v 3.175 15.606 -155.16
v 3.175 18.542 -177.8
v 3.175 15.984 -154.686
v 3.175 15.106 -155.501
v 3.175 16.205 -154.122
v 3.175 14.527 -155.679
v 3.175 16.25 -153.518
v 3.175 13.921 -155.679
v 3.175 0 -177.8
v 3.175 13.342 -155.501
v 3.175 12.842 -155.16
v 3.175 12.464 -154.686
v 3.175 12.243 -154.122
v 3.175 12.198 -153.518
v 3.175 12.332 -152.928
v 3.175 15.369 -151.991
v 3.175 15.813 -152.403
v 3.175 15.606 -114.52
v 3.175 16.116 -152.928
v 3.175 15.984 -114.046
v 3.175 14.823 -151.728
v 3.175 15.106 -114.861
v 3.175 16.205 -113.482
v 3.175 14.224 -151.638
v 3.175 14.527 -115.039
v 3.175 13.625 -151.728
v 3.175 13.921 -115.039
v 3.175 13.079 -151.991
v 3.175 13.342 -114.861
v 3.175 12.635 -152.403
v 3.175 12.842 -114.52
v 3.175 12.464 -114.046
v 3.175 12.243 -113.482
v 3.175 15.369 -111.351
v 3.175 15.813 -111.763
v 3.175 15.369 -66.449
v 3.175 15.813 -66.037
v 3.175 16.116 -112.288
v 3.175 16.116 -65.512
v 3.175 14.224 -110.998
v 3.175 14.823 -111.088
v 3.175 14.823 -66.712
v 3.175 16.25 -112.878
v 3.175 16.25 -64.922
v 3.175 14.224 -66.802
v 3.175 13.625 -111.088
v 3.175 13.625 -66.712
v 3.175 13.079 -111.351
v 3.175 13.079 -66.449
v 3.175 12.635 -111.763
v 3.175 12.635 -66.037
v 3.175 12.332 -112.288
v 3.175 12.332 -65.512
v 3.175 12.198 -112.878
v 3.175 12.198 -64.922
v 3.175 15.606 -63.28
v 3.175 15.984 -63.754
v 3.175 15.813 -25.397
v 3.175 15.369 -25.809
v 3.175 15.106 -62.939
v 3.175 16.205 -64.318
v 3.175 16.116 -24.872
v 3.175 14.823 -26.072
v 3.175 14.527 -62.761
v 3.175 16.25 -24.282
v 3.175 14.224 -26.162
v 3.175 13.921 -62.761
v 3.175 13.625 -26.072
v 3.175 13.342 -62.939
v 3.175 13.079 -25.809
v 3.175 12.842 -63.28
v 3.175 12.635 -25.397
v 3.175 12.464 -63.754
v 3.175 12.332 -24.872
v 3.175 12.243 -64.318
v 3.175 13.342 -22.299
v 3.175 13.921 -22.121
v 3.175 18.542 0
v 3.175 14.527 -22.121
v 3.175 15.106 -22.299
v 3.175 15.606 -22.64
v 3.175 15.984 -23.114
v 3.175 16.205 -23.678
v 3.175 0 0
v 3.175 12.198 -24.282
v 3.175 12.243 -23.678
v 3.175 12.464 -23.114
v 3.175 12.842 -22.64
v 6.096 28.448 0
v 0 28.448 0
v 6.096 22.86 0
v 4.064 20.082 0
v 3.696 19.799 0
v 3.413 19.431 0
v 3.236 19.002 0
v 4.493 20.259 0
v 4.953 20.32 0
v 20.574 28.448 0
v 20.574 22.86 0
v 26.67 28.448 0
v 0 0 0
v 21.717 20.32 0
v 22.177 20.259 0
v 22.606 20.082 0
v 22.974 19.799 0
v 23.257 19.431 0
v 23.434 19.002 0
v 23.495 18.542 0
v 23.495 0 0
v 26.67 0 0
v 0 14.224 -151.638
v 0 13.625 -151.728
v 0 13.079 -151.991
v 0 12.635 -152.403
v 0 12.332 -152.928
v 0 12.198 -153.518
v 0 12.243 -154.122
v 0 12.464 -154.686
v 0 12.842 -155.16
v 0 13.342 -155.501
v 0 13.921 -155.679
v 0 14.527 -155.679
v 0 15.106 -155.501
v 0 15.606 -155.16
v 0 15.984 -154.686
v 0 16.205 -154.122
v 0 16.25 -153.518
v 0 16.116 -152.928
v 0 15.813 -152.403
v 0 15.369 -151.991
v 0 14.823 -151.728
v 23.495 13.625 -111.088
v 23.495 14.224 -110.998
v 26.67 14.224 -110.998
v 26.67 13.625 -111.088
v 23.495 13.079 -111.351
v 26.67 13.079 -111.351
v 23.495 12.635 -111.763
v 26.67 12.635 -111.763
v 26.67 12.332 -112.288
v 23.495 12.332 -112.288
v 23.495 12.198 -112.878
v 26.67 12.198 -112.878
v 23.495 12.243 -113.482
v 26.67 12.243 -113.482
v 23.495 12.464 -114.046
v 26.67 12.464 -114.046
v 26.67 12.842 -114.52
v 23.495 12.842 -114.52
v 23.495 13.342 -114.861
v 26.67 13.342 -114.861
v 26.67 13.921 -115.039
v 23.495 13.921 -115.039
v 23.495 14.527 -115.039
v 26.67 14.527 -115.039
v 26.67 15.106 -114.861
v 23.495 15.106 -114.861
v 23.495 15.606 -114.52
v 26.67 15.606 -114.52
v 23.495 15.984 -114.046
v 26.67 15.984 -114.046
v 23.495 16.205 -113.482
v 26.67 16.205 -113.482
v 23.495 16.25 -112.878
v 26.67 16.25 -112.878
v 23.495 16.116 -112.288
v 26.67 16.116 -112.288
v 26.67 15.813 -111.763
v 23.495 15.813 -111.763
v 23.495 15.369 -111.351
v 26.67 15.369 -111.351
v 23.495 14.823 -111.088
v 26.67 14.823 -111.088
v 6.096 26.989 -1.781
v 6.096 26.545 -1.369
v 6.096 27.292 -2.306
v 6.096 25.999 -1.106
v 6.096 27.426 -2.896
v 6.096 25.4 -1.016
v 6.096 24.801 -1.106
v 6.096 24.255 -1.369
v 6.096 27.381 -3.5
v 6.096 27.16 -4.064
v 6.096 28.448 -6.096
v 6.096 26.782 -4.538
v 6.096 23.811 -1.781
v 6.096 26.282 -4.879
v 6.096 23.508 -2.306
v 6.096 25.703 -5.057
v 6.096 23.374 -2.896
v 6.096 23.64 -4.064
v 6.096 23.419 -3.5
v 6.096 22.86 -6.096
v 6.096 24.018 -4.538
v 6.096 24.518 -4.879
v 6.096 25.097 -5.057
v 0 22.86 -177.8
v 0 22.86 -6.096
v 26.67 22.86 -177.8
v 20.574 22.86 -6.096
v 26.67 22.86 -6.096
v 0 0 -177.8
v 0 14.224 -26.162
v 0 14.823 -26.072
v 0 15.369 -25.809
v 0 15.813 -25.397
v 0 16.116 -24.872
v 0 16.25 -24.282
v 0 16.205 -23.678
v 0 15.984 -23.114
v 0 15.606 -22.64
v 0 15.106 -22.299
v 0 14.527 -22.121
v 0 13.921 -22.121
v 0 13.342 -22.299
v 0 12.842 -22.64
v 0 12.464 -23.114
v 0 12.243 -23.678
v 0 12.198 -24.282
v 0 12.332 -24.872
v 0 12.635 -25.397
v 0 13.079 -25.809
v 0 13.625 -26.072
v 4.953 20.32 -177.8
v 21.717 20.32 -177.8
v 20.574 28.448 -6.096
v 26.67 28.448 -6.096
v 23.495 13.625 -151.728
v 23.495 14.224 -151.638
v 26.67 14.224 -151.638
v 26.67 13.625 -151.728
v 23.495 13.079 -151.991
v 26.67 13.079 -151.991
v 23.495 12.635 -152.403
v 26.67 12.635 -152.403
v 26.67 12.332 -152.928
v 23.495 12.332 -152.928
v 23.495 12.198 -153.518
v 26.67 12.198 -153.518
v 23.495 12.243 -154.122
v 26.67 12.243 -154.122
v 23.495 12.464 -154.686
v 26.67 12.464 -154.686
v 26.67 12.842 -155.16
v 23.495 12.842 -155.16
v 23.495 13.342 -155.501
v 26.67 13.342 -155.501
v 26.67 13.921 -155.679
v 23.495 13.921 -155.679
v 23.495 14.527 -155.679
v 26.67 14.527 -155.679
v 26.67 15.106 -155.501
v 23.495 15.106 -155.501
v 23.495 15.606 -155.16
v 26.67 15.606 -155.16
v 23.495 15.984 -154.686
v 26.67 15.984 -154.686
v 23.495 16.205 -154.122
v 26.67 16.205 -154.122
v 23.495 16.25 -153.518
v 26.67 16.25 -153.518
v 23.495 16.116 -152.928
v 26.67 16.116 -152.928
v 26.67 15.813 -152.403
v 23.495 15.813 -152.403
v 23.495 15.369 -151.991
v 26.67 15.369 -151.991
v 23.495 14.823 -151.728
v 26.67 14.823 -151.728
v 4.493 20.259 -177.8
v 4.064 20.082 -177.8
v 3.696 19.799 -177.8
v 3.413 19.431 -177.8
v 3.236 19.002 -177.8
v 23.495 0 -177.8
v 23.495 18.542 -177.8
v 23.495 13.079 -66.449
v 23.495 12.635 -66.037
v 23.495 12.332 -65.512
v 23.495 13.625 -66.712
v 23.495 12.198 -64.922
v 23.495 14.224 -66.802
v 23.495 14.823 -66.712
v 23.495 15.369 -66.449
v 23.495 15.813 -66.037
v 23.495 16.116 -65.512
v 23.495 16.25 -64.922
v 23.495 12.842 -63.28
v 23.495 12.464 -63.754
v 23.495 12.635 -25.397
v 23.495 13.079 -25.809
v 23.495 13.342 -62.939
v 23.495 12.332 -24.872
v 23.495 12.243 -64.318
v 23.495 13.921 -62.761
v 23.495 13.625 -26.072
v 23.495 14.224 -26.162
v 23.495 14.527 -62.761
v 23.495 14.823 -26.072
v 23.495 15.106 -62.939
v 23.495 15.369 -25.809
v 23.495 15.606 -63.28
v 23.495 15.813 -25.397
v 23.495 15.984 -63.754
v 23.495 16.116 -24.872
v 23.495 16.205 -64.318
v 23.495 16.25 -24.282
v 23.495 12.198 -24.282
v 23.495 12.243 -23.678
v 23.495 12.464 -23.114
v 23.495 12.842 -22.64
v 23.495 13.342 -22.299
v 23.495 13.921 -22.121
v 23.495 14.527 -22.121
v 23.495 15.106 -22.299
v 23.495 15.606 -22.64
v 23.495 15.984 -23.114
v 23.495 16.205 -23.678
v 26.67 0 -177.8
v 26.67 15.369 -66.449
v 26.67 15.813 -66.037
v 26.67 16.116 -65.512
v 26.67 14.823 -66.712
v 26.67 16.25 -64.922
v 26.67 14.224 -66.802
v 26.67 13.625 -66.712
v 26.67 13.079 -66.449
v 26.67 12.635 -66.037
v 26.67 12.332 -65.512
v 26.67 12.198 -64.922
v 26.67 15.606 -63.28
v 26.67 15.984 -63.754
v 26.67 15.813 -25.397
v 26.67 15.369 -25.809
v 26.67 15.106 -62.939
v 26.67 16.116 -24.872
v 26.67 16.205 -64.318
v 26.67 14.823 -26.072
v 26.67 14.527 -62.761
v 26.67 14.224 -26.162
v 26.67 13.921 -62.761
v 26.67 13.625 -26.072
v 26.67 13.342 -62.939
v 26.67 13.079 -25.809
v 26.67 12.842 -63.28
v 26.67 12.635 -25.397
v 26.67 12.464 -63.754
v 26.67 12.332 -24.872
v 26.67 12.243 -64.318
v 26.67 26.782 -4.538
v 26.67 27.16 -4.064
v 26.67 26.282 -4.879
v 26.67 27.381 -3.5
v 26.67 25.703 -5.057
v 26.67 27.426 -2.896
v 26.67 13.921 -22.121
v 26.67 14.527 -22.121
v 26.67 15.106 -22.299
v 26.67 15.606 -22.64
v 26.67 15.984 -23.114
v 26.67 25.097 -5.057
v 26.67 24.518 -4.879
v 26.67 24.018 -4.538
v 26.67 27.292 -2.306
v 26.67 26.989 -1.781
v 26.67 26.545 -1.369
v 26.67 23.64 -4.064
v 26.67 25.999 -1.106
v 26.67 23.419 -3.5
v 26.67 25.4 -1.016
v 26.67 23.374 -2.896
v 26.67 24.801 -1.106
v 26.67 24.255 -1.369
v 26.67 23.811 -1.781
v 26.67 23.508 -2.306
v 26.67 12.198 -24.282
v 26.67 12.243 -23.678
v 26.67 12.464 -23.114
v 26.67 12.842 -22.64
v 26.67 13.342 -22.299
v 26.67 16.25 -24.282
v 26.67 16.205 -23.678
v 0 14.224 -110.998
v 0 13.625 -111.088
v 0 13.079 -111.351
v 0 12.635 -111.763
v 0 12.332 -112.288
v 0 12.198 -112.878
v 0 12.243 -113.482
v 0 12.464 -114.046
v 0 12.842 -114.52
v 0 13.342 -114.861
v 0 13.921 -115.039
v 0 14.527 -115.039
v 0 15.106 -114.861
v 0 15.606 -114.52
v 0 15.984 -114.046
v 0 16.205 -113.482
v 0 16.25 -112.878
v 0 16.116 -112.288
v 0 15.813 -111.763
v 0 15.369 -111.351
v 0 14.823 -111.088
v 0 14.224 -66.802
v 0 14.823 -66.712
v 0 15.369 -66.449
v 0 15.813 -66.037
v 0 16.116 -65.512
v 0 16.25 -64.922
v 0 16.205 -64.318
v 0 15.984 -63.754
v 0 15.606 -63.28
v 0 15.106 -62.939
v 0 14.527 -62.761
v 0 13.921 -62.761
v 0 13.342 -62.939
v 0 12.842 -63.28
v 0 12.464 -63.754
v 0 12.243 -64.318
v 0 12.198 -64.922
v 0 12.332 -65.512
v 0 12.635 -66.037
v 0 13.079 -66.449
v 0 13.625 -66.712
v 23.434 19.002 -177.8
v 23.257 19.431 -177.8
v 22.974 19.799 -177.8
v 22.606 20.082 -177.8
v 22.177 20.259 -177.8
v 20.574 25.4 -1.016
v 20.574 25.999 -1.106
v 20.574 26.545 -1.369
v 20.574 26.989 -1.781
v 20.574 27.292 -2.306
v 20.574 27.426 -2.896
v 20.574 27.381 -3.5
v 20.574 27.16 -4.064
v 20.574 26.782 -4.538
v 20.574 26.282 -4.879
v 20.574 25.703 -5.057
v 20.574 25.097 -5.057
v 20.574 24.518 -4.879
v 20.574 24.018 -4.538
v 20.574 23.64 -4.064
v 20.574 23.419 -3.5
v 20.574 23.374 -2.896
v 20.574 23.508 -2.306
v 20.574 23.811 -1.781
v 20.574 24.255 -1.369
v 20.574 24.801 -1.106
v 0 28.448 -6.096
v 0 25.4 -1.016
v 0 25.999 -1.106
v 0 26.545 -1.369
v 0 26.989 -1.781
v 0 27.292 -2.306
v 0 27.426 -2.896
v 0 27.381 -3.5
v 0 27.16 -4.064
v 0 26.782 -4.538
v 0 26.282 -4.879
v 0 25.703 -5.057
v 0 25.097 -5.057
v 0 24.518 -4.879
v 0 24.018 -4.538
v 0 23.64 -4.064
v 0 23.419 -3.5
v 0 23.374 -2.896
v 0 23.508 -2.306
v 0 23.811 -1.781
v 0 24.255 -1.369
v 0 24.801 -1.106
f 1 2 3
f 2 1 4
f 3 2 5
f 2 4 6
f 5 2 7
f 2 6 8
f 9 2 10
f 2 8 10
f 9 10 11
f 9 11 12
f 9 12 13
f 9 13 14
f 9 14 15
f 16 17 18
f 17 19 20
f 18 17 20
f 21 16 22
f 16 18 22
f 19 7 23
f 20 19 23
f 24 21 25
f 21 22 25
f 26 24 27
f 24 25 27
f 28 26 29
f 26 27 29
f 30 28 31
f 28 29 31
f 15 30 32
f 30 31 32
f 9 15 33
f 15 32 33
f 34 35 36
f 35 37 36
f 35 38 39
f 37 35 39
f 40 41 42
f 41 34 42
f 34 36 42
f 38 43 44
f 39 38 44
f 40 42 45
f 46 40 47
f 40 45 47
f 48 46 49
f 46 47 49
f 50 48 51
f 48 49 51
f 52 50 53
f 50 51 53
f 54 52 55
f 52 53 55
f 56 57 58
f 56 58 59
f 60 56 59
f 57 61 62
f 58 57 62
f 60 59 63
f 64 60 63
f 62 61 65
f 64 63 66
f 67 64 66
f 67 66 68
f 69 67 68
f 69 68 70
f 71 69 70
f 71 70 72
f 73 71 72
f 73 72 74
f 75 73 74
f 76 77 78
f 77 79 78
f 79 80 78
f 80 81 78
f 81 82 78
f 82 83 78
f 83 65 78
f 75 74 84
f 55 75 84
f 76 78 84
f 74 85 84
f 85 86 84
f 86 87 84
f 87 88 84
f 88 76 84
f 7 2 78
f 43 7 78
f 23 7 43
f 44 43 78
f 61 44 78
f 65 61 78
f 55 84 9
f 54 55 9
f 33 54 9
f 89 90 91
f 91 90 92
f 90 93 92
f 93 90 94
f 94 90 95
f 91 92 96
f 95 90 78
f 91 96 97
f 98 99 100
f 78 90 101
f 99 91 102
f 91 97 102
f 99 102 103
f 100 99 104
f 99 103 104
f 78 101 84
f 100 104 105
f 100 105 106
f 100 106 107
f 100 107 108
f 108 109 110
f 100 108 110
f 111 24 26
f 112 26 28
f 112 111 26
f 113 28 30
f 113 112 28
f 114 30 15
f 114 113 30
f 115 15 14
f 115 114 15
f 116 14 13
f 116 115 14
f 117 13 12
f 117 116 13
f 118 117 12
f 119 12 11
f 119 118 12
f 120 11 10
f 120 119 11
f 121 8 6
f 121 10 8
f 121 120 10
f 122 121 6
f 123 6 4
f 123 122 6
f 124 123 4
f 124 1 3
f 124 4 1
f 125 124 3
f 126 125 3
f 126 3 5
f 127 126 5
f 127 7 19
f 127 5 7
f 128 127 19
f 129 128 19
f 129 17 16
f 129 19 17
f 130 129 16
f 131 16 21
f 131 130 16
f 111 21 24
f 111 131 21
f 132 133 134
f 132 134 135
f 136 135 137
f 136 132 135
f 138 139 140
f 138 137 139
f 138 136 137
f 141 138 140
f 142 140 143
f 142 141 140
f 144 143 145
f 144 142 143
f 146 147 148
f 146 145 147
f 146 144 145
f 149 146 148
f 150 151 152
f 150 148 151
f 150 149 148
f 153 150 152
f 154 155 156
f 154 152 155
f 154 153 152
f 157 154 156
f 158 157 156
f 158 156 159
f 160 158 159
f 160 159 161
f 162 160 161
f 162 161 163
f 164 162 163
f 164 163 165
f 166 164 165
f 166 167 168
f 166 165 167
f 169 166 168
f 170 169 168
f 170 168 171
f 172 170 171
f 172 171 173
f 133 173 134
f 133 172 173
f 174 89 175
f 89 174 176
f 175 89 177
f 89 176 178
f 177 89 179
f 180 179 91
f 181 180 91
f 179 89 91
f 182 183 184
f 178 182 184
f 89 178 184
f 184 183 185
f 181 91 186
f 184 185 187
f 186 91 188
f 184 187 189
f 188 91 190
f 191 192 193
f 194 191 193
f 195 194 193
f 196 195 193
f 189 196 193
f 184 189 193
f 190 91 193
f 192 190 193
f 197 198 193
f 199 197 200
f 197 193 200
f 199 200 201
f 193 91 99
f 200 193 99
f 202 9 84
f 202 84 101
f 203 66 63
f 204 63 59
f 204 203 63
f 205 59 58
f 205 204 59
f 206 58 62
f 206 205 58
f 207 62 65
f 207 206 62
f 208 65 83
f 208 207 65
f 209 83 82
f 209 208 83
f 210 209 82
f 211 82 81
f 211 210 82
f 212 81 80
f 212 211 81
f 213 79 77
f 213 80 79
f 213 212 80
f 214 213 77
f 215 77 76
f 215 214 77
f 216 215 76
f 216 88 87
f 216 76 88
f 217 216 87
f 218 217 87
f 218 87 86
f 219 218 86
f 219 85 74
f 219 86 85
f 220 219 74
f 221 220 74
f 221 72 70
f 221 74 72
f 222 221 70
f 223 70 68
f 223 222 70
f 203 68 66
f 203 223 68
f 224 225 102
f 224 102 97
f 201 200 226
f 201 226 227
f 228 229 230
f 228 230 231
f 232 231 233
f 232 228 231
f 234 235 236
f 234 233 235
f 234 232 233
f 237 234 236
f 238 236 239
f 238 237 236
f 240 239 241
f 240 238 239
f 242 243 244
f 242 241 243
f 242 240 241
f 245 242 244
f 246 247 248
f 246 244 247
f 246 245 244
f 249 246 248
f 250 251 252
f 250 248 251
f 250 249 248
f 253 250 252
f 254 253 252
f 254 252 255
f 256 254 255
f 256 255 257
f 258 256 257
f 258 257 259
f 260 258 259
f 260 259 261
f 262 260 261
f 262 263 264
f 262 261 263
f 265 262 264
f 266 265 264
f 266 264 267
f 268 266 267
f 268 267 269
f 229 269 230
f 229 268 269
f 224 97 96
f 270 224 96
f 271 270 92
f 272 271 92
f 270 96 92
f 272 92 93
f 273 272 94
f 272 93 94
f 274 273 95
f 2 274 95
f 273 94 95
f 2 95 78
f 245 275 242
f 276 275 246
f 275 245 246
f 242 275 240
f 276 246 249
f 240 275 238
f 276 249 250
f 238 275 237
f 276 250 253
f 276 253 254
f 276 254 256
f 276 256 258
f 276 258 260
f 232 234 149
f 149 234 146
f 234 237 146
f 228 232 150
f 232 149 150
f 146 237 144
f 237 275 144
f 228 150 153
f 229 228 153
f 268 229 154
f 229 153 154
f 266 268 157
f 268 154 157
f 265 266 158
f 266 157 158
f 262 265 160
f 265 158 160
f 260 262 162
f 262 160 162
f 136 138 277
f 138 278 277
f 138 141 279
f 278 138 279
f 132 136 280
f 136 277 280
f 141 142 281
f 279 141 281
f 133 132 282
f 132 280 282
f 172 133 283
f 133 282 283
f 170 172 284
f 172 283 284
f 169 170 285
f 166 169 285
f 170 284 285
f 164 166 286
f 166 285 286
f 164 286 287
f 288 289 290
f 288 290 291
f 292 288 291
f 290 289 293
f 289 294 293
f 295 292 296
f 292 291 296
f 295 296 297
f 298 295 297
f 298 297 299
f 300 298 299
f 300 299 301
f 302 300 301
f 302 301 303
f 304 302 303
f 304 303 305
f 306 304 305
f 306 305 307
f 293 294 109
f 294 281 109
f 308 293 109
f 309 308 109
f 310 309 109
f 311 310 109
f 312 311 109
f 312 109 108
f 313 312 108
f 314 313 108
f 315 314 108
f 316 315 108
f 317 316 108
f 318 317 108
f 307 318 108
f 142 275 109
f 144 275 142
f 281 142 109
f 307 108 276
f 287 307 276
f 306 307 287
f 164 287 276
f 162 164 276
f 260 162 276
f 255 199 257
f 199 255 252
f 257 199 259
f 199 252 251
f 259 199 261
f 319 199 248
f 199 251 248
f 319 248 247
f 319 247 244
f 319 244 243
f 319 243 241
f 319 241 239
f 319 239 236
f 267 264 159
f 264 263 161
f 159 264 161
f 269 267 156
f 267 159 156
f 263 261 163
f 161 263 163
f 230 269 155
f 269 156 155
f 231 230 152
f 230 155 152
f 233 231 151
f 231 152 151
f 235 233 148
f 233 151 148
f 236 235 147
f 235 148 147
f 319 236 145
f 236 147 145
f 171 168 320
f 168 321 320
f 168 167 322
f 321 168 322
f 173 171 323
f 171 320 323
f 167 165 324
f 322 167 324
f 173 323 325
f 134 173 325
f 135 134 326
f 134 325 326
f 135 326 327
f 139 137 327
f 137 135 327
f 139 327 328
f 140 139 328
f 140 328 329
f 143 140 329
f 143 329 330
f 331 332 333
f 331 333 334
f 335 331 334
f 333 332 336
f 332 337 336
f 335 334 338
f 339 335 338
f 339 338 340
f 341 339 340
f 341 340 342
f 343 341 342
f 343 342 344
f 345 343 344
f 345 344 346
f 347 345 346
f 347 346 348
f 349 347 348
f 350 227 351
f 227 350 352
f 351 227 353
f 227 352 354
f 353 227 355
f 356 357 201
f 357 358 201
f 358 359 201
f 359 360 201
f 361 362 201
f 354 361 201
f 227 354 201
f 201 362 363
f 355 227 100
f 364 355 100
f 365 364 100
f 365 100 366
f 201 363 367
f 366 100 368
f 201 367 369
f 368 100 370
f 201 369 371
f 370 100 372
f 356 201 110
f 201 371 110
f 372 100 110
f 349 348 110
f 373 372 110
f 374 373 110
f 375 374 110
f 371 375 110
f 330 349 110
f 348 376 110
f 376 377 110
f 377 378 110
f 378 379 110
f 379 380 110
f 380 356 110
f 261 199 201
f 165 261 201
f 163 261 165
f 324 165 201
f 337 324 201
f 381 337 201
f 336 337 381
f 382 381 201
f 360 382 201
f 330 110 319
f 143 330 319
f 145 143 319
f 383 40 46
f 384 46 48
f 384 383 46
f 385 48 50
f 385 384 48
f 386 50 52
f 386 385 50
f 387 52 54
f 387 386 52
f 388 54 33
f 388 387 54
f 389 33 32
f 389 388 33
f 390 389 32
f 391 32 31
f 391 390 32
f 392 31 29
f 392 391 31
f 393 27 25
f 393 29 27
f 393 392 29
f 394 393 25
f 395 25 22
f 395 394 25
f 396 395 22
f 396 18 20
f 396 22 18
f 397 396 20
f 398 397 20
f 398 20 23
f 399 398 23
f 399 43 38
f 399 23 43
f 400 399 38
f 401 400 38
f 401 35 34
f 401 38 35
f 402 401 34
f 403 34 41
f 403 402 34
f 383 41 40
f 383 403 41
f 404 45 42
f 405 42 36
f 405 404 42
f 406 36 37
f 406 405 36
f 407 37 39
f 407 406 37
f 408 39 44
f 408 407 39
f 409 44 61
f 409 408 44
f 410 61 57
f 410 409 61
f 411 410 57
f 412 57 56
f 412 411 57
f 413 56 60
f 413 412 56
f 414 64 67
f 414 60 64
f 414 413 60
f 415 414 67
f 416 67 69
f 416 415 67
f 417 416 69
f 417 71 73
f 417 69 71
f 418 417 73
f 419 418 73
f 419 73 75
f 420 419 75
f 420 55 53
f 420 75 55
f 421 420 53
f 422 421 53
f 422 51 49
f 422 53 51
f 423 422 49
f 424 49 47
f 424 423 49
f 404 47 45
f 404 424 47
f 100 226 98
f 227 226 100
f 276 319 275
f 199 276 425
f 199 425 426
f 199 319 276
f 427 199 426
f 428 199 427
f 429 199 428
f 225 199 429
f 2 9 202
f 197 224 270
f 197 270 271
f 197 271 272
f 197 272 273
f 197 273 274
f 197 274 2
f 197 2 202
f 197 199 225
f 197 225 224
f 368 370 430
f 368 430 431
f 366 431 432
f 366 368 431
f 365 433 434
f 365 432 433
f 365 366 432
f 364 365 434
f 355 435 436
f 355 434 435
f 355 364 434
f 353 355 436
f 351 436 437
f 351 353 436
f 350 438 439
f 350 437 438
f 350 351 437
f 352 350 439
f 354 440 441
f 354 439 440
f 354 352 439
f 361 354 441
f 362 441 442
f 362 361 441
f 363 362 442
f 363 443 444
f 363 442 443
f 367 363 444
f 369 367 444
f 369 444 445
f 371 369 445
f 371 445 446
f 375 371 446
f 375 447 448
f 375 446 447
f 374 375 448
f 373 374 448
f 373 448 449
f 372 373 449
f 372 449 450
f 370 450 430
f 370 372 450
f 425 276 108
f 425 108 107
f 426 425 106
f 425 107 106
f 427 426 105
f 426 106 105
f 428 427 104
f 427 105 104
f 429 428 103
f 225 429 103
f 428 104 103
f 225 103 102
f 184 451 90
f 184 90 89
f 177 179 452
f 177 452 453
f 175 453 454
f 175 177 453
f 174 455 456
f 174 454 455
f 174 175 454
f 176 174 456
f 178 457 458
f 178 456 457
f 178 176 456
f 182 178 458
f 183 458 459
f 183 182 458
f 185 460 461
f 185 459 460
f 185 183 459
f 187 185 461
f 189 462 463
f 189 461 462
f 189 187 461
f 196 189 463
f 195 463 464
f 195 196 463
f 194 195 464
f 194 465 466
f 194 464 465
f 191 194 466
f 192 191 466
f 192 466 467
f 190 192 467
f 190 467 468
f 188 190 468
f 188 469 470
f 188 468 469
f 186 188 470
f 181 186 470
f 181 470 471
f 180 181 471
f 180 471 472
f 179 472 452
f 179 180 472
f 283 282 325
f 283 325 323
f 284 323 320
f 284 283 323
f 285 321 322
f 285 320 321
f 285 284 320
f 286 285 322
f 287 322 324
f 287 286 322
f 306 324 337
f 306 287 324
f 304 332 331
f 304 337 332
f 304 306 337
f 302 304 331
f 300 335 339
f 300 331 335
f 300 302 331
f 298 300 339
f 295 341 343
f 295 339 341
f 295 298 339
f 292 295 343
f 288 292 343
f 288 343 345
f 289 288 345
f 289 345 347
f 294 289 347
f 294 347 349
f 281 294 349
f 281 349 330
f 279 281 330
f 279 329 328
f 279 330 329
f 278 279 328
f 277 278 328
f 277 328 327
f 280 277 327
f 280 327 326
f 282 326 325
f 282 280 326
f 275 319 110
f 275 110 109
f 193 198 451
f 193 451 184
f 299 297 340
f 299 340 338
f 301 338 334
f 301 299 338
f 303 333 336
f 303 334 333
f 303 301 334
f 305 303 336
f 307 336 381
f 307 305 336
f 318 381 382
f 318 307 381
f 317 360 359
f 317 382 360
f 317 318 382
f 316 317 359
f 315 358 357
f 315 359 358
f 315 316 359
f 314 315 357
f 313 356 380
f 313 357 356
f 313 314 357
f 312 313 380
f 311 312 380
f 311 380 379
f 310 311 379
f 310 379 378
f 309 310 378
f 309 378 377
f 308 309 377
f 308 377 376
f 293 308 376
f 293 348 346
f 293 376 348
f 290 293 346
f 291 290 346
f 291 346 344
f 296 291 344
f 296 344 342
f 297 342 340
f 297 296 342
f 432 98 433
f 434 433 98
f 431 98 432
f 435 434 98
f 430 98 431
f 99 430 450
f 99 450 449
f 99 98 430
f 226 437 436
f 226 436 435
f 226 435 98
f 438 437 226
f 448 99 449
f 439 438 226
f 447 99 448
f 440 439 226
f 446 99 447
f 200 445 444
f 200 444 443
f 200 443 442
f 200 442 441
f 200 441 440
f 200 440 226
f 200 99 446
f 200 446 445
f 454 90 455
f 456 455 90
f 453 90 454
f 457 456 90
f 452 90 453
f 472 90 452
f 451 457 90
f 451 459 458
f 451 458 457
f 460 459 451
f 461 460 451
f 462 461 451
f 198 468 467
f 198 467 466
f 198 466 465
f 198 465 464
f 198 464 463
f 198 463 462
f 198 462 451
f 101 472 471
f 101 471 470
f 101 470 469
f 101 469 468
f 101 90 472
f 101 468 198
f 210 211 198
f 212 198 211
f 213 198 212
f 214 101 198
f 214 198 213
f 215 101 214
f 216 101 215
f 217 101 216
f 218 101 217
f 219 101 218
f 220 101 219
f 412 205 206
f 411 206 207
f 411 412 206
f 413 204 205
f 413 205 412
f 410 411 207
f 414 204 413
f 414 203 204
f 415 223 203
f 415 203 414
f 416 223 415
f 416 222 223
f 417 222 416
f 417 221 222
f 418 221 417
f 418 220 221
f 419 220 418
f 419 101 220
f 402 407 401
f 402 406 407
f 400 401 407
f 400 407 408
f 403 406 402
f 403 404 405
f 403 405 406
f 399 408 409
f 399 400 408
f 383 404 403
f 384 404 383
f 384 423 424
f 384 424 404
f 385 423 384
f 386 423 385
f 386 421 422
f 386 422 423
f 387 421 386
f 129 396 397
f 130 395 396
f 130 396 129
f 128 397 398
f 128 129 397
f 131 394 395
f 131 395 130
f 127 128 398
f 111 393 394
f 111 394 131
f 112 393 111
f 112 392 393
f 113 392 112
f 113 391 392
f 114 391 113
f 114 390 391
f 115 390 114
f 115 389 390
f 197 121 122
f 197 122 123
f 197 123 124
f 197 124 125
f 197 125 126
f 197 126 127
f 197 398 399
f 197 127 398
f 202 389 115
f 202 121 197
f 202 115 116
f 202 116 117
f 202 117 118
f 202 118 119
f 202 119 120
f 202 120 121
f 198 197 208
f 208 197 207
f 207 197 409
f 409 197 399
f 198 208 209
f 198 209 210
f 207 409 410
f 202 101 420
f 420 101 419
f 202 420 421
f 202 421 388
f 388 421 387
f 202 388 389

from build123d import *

# Parameters (mm, degrees)
BOSS_EXTRUDE2_DEPTH     = 177.8
SKETCH19_R              = 2.032
CUT_EXTRUDE3_DEPTH      = 182.236609161
SKETCH21_W              = 6.096
SKETCH21_H              = 6.096
BOSS_EXTRUDE4_DEPTH     = 5.588
CUT_EXTRUDE4_DEPTH      = 182.233049359
CUT_EXTRUDE4_DEPTH_BACK = 182.233049359
SKETCH22_R              = 2.032


with BuildPart() as part:
    # Sketch2 → Boss-Extrude2 (new body)
    with BuildSketch(Plane.XY):
        with BuildLine():
            Line((0, 0), (0, 22.86))
            Line((0, 22.86), (26.67, 22.86))
            Line((26.67, 22.86), (26.67, 0))
            Line((26.67, 0), (23.495, 0))
            Line((23.495, 0), (23.495, 18.542))
            ThreePointArc((23.495, 18.542), (22.974235857, 19.799235857), (21.717, 20.32))
            Line((21.717, 20.32), (4.953, 20.32))
            ThreePointArc((4.953, 20.32), (3.695764143, 19.799235857), (3.175, 18.542))
            Line((3.175, 18.542), (3.175, 0))
            Line((3.175, 0), (0, 0))
        make_face()
    extrude(amount=-BOSS_EXTRUDE2_DEPTH)

    # Sketch19 → Cut-Extrude3 (cut, through all)
    with BuildSketch(Plane(origin=(0, 0, 0), x_dir=(0, 0, -1), z_dir=(1, 0, 0))):
        with Locations((24.13, 14.224)):
            Circle(SKETCH19_R)
        with Locations((64.77, 14.224)):
            Circle(SKETCH19_R)
        with Locations(Location((113.03, 14.224, 0), (0, 0, 180))):
            Circle(SKETCH19_R)
        with Locations(Location((153.67, 14.224, 0), (0, 0, 180))):
            Circle(SKETCH19_R)
    extrude(amount=CUT_EXTRUDE3_DEPTH, mode=Mode.SUBTRACT)

    # Sketch21 → Boss-Extrude4 (add)
    with BuildSketch(Plane(origin=(0, 22.86, 0), x_dir=(1, 0, 0), z_dir=(0, 1, 0))):
        with Locations((3.048, 3.048)):
            Rectangle(SKETCH21_W, SKETCH21_H)
        with Locations((23.622, 3.048)):
            Rectangle(SKETCH21_W, SKETCH21_H)
    extrude(amount=BOSS_EXTRUDE4_DEPTH)

    # Sketch22 → Cut-Extrude4 (cut, two sides: drawn at the far end of the back side and taken through both)
    with BuildSketch(Plane.ZY.offset(-20.574).offset(-CUT_EXTRUDE4_DEPTH_BACK)):
        with Locations((-3.048, 25.4)):
            Circle(SKETCH22_R)
    extrude(amount=CUT_EXTRUDE4_DEPTH + CUT_EXTRUDE4_DEPTH_BACK, mode=Mode.SUBTRACT)


solid = part.part
